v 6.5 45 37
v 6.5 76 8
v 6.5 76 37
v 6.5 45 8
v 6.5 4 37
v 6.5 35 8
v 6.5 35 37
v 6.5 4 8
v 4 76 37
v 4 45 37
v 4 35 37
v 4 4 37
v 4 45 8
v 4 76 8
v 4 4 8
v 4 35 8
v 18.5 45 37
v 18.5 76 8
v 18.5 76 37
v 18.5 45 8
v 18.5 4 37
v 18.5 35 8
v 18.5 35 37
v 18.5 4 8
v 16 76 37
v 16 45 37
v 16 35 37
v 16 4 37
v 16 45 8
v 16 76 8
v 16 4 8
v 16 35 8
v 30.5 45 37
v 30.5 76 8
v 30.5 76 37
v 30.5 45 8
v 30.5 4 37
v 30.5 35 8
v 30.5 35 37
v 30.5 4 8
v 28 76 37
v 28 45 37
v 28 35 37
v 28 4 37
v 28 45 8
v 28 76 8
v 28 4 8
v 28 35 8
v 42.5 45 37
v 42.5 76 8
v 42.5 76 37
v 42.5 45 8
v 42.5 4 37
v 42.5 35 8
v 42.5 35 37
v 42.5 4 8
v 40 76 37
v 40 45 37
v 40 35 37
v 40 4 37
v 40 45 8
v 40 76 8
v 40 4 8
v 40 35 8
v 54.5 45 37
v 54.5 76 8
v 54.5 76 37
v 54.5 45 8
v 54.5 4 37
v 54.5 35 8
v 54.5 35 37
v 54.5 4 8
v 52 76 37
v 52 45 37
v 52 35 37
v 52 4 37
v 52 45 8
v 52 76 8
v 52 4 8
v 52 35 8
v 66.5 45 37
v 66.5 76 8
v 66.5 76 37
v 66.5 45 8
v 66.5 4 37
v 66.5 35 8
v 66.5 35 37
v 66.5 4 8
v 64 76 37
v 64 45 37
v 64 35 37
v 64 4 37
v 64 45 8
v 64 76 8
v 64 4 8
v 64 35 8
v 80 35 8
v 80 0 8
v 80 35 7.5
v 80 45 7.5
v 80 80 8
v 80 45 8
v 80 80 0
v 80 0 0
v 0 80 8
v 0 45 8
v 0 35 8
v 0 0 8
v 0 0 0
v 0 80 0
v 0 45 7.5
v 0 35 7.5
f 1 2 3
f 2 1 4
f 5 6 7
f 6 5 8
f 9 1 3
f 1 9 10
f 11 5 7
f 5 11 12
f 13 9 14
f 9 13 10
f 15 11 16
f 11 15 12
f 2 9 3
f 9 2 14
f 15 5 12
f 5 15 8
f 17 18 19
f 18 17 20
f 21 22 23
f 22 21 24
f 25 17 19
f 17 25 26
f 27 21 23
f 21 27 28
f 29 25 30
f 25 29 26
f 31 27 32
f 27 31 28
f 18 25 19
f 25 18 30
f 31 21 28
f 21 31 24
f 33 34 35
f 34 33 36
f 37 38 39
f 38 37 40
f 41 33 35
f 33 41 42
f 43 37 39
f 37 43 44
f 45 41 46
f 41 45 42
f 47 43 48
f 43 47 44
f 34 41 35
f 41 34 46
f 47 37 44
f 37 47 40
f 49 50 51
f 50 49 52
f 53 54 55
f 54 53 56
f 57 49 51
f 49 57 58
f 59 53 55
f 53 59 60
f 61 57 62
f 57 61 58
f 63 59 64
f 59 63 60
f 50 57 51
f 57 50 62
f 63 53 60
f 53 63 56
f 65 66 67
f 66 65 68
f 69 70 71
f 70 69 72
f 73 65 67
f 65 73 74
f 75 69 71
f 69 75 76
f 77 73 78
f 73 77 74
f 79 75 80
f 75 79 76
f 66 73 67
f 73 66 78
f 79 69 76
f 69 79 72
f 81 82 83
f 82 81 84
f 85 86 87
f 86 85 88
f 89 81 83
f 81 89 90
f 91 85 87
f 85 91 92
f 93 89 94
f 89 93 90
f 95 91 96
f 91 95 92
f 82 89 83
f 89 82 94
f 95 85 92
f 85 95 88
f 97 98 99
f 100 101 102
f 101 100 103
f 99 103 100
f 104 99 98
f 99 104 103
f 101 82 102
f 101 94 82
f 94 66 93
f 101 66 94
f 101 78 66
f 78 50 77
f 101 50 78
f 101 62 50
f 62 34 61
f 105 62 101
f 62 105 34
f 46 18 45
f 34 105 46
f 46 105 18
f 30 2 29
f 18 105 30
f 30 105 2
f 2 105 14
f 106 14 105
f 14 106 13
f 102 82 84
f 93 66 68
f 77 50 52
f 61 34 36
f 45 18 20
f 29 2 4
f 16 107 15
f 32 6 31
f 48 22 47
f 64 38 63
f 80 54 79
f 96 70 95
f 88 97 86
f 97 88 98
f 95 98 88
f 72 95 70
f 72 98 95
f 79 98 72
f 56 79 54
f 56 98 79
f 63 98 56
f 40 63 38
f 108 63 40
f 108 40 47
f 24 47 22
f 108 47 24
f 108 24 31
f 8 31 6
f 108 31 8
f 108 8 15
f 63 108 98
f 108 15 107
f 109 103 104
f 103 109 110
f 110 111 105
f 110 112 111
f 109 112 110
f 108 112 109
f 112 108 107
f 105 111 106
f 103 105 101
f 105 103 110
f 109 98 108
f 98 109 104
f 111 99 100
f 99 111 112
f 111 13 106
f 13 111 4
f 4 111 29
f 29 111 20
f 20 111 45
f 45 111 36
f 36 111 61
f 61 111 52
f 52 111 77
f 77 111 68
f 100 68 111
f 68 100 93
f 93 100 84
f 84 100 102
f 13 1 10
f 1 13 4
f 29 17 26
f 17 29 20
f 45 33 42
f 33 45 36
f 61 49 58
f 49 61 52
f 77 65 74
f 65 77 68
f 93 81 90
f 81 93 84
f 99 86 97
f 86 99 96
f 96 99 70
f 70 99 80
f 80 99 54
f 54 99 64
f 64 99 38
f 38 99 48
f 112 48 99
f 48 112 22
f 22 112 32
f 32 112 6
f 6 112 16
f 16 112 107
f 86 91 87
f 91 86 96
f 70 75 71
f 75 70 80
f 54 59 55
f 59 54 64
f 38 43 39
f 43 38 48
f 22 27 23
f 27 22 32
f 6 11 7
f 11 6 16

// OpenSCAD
$fn = 32;

// ----------------------------------------------------------------------
// Heatsink: slotted fin block
// ----------------------------------------------------------------------

// --- parameters (mm) ---
base_l = 80;              // base length, X
base_w = 80;              // base width, Y
base_t = 8;               // base plate thickness
fin_h = 30;               // fin height above the base
fin_t = 2.5;              // fin thickness
edge = 4;                 // margin from the base ends
pitch = 12;               // fin pitch
slot_w = 10;              // central slot width, Y

n_fins = floor((base_l - 2 * edge - fin_t) / pitch) + 1;  // fin count
total_h = base_t + fin_h - 1;  // overall height

difference() {
union() {
  cube([base_l, base_w, base_t]);
  for (i = [0 : n_fins - 1])
    translate([edge + i * pitch, edge, base_t - 1])
      cube([fin_t, base_w - 2 * edge, fin_h]);
}
  translate([-1, base_w / 2 - slot_w / 2, base_t - 0.5])
    cube([base_l + 2, slot_w, fin_h + 2]);
}
